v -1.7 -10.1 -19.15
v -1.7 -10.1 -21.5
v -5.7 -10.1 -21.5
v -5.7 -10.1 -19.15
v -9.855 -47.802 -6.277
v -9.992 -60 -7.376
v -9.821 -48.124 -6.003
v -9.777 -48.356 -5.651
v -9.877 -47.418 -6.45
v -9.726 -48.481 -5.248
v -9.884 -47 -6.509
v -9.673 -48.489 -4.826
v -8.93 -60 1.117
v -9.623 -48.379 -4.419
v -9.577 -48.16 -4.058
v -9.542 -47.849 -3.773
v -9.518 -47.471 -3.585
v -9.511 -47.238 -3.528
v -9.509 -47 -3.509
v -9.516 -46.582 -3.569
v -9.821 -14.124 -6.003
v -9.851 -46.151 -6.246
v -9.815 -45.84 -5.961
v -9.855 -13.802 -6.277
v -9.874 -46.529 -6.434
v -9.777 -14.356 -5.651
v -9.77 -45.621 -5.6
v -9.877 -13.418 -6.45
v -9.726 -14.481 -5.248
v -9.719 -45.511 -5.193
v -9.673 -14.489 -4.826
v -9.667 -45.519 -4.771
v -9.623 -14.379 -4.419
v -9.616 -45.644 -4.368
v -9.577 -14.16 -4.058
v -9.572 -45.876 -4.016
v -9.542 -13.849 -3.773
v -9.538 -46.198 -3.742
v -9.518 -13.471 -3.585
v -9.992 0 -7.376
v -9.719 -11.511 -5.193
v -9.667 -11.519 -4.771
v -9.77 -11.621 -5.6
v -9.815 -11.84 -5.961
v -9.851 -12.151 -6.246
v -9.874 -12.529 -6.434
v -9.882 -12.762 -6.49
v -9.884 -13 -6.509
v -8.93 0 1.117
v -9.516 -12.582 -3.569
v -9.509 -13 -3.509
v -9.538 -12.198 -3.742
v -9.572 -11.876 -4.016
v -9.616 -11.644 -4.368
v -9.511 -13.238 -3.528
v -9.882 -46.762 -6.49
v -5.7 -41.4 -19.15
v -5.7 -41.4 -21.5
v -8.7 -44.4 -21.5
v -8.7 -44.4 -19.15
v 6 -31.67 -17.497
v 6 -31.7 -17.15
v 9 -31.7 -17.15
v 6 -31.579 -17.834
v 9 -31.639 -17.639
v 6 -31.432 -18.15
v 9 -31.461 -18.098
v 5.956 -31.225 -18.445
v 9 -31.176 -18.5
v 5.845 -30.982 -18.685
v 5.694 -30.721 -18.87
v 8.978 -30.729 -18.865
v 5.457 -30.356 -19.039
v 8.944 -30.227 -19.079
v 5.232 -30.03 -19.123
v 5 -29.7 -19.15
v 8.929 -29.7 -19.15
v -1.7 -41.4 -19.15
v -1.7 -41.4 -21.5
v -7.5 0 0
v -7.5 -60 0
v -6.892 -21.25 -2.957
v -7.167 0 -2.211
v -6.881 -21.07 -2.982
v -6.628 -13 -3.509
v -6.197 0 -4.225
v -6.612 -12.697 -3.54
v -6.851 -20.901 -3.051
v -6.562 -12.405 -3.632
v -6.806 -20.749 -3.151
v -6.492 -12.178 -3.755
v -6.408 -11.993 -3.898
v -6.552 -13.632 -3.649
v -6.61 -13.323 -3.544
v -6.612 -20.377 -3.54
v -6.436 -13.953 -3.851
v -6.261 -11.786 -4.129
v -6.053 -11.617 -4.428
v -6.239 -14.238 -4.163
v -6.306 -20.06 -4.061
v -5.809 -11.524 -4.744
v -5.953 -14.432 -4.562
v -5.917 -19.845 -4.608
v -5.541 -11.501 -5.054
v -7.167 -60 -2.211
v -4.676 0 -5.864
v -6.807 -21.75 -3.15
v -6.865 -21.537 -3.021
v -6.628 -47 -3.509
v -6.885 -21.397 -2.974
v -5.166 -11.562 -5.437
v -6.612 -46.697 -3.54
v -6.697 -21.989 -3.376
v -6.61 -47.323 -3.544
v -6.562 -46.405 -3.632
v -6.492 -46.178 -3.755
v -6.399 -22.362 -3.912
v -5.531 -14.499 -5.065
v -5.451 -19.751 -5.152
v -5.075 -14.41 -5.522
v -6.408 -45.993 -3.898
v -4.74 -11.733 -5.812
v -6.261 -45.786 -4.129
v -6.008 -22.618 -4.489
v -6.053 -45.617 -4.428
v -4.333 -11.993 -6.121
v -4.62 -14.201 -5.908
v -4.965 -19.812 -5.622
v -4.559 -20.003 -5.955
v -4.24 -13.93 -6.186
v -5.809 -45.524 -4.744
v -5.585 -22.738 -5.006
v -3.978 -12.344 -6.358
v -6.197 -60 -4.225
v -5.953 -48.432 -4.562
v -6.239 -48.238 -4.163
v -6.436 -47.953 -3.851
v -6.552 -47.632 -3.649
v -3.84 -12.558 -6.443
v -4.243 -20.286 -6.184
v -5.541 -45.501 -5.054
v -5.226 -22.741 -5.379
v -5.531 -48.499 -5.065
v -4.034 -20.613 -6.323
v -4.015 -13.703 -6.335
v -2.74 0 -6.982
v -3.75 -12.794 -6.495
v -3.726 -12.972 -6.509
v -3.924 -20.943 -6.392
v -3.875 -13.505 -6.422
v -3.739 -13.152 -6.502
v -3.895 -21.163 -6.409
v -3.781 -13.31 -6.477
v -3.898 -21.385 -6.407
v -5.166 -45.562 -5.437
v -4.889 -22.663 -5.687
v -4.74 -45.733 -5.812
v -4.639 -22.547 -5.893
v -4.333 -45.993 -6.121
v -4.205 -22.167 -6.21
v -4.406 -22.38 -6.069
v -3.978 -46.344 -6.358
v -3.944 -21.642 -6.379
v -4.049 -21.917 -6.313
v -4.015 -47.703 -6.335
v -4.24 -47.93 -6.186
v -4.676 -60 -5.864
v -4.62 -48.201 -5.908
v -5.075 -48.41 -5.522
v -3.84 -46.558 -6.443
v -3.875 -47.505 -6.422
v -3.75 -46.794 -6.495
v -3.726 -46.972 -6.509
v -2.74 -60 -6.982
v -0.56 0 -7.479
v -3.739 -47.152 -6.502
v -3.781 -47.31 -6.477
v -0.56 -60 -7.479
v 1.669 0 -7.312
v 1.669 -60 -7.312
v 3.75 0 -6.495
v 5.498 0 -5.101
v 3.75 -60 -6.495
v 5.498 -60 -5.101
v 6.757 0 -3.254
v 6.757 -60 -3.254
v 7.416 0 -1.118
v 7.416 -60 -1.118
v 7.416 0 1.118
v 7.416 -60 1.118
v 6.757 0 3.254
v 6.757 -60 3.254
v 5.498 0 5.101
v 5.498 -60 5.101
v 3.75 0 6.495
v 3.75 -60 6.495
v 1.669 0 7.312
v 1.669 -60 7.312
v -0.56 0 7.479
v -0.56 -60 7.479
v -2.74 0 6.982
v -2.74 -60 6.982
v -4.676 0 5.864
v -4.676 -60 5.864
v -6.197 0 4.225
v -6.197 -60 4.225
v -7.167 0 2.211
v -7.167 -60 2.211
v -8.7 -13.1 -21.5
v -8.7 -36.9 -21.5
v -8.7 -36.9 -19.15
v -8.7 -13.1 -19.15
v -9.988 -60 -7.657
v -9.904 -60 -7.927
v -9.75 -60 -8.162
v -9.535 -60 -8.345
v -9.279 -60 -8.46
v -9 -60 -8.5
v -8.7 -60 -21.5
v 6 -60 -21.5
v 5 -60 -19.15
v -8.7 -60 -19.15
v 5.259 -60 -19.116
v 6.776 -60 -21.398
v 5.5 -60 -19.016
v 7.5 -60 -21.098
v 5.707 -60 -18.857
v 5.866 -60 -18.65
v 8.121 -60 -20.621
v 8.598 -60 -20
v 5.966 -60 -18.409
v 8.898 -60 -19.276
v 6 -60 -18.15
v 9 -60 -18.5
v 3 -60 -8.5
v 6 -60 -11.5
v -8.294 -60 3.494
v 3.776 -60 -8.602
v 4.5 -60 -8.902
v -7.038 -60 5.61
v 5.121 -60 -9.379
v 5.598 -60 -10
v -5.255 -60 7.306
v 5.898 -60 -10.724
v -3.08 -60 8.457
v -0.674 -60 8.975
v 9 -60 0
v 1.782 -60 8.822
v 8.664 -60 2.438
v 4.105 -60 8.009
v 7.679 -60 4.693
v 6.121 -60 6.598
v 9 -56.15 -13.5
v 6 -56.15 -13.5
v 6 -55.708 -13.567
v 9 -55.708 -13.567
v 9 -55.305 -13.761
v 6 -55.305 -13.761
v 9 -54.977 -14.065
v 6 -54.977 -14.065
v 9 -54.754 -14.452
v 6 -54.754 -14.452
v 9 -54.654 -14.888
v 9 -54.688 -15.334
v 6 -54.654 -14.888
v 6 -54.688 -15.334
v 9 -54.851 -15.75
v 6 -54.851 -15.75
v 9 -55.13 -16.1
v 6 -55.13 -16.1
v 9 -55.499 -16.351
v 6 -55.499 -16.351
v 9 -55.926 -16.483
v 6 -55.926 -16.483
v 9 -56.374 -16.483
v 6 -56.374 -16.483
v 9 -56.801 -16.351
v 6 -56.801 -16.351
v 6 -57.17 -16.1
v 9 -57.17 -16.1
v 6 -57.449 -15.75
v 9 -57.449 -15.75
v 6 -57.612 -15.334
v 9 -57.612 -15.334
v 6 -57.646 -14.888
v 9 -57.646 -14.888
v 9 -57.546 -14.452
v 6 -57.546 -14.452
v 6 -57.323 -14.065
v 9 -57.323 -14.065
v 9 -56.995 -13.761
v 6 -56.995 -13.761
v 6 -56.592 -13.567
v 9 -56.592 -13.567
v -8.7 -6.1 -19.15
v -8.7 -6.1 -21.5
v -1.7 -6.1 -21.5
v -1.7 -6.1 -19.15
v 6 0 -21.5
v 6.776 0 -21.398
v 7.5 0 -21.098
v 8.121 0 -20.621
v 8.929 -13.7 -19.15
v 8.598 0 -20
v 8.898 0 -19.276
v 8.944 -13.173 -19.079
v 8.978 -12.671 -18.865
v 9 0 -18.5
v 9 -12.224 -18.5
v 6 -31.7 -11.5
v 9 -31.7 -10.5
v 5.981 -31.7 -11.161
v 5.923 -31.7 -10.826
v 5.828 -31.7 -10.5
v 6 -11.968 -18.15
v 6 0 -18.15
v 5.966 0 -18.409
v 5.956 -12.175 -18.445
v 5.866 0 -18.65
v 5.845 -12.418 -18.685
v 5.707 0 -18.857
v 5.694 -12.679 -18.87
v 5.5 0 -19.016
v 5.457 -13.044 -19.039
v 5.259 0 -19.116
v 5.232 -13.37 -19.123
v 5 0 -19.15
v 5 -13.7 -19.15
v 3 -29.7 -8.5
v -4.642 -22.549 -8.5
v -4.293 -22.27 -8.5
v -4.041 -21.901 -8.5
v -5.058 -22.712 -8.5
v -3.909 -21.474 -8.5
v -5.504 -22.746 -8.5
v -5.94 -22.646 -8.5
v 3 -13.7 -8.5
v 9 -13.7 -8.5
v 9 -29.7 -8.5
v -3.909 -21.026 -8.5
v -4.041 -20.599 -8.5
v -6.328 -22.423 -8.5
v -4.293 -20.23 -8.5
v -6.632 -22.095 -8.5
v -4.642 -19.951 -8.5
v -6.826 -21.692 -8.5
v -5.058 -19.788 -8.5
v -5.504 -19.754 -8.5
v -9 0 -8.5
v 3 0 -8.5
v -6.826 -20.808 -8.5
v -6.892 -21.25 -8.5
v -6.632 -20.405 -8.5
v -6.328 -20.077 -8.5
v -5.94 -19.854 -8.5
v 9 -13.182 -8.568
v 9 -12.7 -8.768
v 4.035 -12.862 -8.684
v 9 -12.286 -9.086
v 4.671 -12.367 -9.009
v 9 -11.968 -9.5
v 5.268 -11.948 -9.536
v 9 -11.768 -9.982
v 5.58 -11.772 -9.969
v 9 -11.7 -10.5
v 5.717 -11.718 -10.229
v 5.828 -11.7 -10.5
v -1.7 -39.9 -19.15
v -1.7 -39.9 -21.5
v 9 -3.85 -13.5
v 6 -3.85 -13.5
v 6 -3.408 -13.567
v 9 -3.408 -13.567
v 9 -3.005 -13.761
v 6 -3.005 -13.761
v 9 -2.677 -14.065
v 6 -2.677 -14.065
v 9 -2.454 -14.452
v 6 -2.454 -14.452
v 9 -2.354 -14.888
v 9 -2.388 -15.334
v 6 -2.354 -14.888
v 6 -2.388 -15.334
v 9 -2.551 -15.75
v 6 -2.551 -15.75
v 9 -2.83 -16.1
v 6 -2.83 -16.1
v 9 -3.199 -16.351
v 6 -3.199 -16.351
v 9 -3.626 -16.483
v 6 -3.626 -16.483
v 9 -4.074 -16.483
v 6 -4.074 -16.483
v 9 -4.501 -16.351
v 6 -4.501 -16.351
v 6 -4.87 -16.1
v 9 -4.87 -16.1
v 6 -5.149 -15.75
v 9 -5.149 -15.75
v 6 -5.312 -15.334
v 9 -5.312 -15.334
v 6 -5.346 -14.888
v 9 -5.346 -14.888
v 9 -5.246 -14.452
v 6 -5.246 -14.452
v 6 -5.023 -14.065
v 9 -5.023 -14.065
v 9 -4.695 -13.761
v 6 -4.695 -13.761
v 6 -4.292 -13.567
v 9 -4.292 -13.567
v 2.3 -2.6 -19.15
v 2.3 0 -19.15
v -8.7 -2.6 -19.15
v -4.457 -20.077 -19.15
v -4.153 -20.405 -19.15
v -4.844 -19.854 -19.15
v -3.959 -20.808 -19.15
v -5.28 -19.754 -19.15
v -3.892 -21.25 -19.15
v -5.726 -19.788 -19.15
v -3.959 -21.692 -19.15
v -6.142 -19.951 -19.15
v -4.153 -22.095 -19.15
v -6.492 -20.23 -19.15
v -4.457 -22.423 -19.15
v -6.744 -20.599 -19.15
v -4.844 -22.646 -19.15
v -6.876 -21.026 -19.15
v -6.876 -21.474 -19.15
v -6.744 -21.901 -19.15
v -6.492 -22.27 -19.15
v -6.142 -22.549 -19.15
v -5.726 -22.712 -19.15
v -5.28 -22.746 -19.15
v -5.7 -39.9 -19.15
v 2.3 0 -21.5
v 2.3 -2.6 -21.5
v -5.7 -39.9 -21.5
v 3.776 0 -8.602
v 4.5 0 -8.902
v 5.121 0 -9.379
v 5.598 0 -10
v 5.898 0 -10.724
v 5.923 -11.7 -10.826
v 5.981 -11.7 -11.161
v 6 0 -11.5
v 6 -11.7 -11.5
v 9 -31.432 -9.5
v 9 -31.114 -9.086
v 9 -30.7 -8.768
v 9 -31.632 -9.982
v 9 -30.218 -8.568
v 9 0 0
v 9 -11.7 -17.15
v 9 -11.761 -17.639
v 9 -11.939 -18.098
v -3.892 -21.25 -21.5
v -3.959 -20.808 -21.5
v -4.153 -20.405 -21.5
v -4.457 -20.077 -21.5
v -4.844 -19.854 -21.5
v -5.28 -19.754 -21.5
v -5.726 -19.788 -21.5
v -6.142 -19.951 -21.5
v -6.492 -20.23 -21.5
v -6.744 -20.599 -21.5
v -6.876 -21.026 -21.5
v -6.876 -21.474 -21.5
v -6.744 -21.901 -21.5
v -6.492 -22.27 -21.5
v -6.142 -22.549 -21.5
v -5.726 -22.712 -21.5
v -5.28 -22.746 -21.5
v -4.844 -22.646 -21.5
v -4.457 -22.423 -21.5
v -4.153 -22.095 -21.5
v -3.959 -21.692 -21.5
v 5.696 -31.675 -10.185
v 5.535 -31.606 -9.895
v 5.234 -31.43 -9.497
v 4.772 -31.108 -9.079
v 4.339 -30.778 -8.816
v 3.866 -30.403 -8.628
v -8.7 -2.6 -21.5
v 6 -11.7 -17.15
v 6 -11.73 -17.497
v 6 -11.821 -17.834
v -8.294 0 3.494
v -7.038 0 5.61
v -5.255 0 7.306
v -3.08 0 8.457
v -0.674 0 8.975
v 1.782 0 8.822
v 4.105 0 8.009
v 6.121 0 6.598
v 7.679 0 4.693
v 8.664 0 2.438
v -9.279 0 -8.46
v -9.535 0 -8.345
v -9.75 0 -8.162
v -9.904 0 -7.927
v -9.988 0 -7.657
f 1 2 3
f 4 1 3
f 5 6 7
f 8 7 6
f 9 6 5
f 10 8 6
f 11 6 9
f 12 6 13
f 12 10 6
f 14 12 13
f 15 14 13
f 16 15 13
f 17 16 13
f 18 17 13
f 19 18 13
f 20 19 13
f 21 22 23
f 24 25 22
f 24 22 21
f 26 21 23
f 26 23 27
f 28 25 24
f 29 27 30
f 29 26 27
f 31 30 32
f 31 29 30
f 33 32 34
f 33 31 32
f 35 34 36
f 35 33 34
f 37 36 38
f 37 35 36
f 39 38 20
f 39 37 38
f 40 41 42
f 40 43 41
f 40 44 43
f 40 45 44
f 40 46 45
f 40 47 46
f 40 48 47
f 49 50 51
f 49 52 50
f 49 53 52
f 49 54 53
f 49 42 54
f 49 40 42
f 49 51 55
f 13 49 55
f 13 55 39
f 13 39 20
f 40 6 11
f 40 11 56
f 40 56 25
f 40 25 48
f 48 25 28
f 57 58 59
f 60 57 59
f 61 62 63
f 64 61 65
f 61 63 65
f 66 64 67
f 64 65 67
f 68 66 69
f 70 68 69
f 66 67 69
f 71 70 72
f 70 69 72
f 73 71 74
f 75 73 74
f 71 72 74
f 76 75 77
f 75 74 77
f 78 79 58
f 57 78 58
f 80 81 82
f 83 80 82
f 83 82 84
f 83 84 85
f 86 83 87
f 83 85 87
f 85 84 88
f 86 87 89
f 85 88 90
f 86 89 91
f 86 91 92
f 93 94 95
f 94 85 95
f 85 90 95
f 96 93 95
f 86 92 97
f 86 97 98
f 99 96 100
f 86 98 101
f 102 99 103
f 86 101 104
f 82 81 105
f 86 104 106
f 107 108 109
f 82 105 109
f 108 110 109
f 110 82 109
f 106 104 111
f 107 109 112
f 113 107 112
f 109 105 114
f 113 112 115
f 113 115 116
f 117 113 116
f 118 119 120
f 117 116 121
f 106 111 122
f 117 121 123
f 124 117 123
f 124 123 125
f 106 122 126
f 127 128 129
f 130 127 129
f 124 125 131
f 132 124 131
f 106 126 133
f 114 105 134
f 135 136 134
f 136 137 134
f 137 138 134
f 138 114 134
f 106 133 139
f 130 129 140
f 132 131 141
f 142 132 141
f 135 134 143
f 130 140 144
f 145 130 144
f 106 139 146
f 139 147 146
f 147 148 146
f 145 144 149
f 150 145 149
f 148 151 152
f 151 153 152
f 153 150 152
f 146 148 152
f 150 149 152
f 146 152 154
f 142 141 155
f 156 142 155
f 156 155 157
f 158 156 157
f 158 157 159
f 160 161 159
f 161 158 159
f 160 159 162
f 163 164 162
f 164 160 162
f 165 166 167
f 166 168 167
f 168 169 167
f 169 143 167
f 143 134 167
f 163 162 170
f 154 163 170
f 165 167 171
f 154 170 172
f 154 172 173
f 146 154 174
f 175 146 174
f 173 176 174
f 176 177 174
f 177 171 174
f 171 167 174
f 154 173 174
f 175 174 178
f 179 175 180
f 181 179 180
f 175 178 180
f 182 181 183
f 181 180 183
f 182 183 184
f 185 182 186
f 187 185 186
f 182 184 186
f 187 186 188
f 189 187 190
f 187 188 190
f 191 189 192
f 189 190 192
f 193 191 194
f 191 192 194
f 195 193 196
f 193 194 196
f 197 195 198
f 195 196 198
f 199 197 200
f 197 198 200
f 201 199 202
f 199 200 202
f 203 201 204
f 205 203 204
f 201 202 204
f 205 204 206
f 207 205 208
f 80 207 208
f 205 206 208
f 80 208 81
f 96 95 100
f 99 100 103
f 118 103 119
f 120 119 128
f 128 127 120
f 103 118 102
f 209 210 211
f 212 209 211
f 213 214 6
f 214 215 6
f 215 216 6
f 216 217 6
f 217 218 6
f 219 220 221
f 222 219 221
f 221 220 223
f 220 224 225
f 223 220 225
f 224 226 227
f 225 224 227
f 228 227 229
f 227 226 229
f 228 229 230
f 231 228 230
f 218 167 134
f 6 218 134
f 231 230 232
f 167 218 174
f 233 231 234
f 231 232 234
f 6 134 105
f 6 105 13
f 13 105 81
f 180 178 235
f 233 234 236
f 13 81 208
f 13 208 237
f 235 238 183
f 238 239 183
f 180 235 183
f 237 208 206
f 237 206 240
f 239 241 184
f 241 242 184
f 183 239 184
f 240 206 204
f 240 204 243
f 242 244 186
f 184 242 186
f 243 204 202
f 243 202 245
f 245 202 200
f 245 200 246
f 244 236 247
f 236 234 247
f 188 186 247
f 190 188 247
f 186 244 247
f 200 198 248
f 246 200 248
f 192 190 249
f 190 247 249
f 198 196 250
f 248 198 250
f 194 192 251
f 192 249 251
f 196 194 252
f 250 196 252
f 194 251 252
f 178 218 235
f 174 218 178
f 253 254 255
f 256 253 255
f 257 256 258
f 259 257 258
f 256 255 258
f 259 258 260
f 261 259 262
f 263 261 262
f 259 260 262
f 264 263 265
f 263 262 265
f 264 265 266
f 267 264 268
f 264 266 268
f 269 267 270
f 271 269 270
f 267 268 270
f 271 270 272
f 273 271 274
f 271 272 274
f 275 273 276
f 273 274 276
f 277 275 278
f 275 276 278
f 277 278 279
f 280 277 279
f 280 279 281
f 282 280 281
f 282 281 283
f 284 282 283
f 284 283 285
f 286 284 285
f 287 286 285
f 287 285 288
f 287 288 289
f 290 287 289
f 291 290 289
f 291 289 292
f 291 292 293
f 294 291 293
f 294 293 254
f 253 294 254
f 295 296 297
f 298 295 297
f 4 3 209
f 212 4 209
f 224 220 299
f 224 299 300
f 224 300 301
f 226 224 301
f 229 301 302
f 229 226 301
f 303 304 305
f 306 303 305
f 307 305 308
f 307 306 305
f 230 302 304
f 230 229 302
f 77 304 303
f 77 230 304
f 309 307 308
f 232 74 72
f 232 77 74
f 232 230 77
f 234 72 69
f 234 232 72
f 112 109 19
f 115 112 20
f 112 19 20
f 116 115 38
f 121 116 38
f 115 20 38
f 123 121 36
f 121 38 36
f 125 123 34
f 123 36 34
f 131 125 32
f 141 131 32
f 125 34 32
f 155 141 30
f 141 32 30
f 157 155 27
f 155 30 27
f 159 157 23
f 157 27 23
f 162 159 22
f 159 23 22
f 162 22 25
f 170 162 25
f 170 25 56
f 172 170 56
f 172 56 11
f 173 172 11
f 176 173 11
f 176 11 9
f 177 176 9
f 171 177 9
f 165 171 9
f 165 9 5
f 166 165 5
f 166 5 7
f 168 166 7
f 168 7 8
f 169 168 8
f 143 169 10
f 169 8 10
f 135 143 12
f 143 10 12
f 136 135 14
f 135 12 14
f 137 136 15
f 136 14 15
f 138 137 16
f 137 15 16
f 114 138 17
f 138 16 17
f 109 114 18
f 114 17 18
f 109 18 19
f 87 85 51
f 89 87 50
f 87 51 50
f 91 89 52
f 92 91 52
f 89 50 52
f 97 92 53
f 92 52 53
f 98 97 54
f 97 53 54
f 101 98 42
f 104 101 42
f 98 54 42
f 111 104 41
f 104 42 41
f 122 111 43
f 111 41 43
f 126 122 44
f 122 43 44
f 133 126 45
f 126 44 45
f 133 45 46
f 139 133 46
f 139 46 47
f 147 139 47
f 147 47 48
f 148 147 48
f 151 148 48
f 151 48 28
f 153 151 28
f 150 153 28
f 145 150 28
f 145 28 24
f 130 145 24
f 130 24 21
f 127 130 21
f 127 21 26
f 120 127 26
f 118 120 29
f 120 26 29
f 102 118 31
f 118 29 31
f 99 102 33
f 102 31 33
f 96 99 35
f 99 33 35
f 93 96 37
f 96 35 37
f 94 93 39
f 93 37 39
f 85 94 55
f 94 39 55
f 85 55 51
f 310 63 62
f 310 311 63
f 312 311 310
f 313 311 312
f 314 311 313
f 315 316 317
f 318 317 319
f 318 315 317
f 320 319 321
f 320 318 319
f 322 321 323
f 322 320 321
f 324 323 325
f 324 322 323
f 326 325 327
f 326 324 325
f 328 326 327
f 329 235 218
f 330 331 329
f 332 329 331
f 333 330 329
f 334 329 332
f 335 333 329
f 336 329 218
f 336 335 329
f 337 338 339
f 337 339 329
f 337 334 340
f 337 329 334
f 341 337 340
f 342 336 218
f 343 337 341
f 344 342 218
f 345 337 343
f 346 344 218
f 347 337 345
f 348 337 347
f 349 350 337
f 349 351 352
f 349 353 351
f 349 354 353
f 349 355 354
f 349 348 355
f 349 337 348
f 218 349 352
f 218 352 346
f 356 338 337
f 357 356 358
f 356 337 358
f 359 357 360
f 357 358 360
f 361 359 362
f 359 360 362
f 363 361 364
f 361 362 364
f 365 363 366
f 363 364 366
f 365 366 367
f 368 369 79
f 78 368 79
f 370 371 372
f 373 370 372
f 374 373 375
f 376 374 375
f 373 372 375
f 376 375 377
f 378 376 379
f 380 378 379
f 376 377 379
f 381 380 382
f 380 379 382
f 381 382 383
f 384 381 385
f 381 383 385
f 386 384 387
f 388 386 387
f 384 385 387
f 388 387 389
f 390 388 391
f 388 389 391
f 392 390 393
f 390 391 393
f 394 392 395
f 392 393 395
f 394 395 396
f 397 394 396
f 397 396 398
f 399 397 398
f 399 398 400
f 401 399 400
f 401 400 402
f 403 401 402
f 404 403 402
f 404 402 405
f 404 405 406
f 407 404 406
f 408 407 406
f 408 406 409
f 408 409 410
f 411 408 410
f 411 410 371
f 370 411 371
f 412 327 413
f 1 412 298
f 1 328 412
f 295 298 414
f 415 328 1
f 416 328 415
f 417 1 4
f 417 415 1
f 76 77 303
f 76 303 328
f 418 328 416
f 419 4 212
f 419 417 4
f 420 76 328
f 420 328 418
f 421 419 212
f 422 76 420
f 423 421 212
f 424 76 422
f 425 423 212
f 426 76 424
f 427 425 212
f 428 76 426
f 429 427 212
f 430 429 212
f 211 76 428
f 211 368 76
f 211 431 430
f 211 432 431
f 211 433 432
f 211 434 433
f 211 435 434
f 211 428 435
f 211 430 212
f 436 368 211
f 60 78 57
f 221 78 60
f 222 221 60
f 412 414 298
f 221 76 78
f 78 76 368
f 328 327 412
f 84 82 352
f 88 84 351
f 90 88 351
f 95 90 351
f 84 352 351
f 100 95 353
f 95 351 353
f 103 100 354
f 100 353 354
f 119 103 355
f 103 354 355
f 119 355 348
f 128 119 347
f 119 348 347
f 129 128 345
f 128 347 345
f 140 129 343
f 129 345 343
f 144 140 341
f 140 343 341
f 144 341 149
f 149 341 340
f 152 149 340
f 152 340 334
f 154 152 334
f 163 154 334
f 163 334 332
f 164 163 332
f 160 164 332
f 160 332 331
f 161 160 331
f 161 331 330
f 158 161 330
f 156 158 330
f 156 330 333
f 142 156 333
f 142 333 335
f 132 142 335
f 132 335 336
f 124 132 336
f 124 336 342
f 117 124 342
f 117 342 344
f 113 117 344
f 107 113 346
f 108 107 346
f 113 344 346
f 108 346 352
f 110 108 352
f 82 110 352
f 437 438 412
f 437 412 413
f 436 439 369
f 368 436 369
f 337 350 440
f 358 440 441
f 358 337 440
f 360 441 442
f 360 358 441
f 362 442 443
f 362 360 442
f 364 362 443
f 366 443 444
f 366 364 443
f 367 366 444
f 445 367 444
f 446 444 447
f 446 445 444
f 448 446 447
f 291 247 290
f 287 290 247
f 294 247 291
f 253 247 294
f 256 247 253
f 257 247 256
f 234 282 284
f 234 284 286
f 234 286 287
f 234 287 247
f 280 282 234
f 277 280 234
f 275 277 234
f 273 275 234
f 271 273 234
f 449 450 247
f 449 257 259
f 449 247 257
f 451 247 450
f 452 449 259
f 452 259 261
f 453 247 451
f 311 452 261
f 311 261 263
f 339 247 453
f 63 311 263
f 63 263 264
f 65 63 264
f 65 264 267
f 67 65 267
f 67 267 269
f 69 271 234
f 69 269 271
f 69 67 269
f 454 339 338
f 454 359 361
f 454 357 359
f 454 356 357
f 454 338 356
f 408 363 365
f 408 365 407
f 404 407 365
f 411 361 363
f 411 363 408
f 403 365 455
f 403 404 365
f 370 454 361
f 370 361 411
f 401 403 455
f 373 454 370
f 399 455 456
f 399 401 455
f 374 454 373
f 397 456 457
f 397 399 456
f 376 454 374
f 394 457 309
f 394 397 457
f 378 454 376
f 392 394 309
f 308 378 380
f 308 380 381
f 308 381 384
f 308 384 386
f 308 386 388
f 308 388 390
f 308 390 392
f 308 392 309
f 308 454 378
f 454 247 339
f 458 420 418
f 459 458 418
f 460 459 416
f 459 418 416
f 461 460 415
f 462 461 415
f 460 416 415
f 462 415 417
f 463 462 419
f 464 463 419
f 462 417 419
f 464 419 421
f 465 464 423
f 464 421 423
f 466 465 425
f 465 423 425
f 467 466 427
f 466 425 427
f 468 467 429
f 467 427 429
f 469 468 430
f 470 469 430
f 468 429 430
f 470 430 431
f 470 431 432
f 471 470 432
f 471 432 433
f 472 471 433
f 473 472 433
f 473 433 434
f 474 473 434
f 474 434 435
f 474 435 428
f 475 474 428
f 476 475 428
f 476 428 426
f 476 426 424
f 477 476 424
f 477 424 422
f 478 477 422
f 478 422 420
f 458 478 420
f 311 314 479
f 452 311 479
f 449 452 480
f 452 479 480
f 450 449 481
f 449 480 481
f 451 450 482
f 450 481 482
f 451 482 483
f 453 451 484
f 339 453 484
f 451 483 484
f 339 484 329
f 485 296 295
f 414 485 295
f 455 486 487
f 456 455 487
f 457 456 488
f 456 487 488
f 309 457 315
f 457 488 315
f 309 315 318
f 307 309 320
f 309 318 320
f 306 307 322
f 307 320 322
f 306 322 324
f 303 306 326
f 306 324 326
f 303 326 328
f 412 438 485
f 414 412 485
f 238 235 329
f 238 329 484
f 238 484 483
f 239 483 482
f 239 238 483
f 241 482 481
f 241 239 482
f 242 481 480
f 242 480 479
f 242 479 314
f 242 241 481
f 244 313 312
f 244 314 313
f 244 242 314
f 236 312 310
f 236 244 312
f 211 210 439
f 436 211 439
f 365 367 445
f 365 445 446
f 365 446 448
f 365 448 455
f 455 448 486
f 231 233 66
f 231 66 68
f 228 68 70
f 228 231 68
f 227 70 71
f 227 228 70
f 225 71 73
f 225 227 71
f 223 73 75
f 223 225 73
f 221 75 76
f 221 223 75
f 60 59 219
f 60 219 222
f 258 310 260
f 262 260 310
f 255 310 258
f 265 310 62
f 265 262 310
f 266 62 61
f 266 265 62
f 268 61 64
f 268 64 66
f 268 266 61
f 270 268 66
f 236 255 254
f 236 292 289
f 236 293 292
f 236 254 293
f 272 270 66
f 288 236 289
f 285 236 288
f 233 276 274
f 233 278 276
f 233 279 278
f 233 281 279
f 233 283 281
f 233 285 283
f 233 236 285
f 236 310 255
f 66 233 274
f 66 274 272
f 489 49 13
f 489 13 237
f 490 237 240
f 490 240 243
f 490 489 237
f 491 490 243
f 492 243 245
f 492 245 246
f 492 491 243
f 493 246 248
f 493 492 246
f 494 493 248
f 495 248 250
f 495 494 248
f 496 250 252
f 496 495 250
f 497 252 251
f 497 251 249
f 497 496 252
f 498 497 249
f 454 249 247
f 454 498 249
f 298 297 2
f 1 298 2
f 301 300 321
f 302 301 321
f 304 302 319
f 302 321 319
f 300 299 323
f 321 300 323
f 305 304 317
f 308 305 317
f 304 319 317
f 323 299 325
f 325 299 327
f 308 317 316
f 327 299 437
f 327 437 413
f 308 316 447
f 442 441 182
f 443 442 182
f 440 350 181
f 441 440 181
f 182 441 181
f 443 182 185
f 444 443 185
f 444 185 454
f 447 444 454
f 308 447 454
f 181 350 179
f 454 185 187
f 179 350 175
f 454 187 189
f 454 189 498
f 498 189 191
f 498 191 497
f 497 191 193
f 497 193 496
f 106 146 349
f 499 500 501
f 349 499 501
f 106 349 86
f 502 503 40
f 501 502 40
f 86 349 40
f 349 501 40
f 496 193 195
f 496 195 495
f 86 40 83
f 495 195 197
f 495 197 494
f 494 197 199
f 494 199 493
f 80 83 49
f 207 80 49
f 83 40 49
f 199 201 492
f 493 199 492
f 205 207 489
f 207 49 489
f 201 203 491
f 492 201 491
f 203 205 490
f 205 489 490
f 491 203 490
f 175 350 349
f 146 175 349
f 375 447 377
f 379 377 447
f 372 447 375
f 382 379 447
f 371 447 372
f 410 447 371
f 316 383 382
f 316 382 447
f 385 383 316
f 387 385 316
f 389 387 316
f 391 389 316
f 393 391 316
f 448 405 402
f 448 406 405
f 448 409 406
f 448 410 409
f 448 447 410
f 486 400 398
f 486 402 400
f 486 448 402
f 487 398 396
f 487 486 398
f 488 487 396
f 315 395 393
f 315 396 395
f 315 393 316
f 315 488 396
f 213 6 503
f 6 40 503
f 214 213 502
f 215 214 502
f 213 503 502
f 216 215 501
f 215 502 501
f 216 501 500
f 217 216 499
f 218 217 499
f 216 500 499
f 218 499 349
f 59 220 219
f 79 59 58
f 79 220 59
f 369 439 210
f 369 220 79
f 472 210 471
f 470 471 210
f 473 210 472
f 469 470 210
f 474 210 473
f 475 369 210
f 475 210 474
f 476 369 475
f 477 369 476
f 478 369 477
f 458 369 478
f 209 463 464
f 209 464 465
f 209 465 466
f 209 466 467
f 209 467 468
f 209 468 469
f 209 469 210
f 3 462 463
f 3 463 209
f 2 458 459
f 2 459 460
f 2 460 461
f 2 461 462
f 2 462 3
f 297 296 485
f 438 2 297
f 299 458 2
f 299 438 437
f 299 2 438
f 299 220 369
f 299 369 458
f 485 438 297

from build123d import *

# Parameters (mm, degrees)
EXTRUDE_1_DEPTH            = 11.7
EXTRUDE_2_DEPTH            = 20
SKETCH_3_W                 = 3
SKETCH_3_H                 = 2.35
EXTRUDE_3_DEPTH            = 20
EXTRUDE_4_DEPTH            = 28.3
SKETCH_5_W                 = 2.35
SKETCH_5_H                 = 60
EXTRUDE_5_DEPTH            = 14.7
CUT_EXTRUDE_1_REACH        = 70.066
SKETCH_6_W                 = 11
SKETCH_6_H                 = 2.6
CUT_EXTRUDE_2_REACH        = 70.066
CUT_EXTRUDE_3_REACH        = 70.066
HOLE_WIZARD_3_0_3_1_D      = 3
HOLE_WIZARD_3_0_3_1_DEPTH  = 19.132814283
HOLE_WIZARD_3_0_3_2_D      = 3
HOLE_WIZARD_3_0_3_2_DEPTH  = 2.35
HOLE_WIZARD_15_0_15_1_D    = 15
HOLE_WIZARD_3_0_3_3_REACH  = 65.316
HOLE_WIZARD_3_0_3_3_BORE_R = 1.5
HOLE_WIZARD_3_0_3_4_REACH  = 68.474
HOLE_WIZARD_3_0_3_4_BORE_R = 1.5
FILLET_1_R                 = 1
FILLET_2_R                 = 2
FILLET_START               = 2.9999999
FILLET_3_DEPTH             = 3.0000001
FILLET_START_2             = -60
FILLET_3_2_DEPTH           = 60


with BuildPart() as part:
    # Эскиз1 → Бобышка-Вытянуть1 (new body)
    with BuildSketch(Plane(origin=(0, 0, 0), x_dir=(1, 0, 0), z_dir=(0, 1, 0))):
        with BuildLine():
            Line((9, 21.5), (6, 21.5))
            Line((6, 21.5), (6, 8.5))
            Line((6, 8.5), (-10.132814283, 8.5))
            Line((-10.132814283, 8.5), (-8.930469533, -1.11656344))
            ThreePointArc((-8.930469533, -1.11656344), (0.55936312, -8.982600564), (9, 0))
            Line((9, 0), (9, 21.5))
        make_face()
    extrude(amount=-EXTRUDE_1_DEPTH)

    # Эскиз2 → Бобышка-Вытянуть2 (add)
    with BuildSketch(Plane.XZ.offset(11.7)):
        with BuildLine():
            Line((9, -8.5), (-10.132814283, -8.5))
            Line((-10.132814283, -8.5), (-8.930469533, 1.11656344))
            ThreePointArc((-8.930469533, 1.11656344), (0.55936312, 8.982600564), (9, 0))
            Line((9, 0), (9, -8.5))
        make_face()
    extrude(amount=EXTRUDE_2_DEPTH)

    # Эскиз3 → Бобышка-Вытянуть3 (add)
    with BuildSketch(Plane.XZ.offset(11.7)):
        with Locations((7.5, -20.325)):
            Rectangle(SKETCH_3_W, SKETCH_3_H)
    extrude(amount=EXTRUDE_3_DEPTH)

    # Эскиз4 → Бобышка-Вытянуть4 (add)
    with BuildSketch(Plane.XZ.offset(31.7)):
        with BuildLine():
            Line((6, -21.5), (6, -8.5))
            Line((6, -8.5), (-10.132814283, -8.5))
            Line((-10.132814283, -8.5), (-8.930469533, 1.11656344))
            ThreePointArc((-8.930469533, 1.11656344), (0.55936312, 8.982600564), (9, 0))
            Line((9, 0), (9, -21.5))
            Line((9, -21.5), (6, -21.5))
        make_face()
    extrude(amount=EXTRUDE_4_DEPTH)

    # Эскиз5 → Бобышка-Вытянуть5 (add)
    with BuildSketch(Plane.ZY.offset(-6)):
        with Locations((-20.325, -30)):
            Rectangle(SKETCH_5_W, SKETCH_5_H)
    extrude(amount=EXTRUDE_5_DEPTH)

    # Эскиз6 → Вырез-Вытянуть1 (cut, up to next)
    with BuildSketch(Plane(origin=(0, 0, -21.5), x_dir=(-1, 0, 0), z_dir=(0, 0, -1)), mode=Mode.PRIVATE) as cut_extrude_1_sk1:
        with Locations((3.2, -1.3)):
            Rectangle(SKETCH_6_W, SKETCH_6_H)
    cut_extrude_1_tool1 = extrude(cut_extrude_1_sk1.sketch, amount=-CUT_EXTRUDE_1_REACH, mode=Mode.PRIVATE) & part.part
    add(cut_extrude_1_tool1.solids().sort_by_distance((-3.2, -1.3, -21.5))[0], mode=Mode.SUBTRACT)

    # Эскиз7 → Вырез-Вытянуть2 (cut, up to next)
    with BuildSketch(Plane(origin=(0, 0, -21.5), x_dir=(-1, 0, 0), z_dir=(0, 0, -1)), mode=Mode.PRIVATE) as cut_extrude_2_sk1:
        Polygon((8.7, -13.1), (8.7, -6.1), (1.7, -6.1), (1.7, -10.1), (5.7, -10.1), align=None)
    cut_extrude_2_tool1 = extrude(cut_extrude_2_sk1.sketch, amount=-CUT_EXTRUDE_2_REACH, mode=Mode.PRIVATE) & part.part
    add(cut_extrude_2_tool1.solids().sort_by_distance((-5.546154, -8.515385, -21.5))[0], mode=Mode.SUBTRACT)

    # Эскиз8 → Вырез-Вытянуть3 (cut, up to next)
    with BuildSketch(Plane(origin=(0, 0, -21.5), x_dir=(-1, 0, 0), z_dir=(0, 0, -1)), mode=Mode.PRIVATE) as cut_extrude_3_sk1:
        Polygon((8.7, -44.4), (8.7, -36.9), (5.7, -39.9), (1.7, -39.9), (1.7, -41.4), (5.7, -41.4), align=None)
    cut_extrude_3_tool1 = extrude(cut_extrude_3_sk1.sketch, amount=-CUT_EXTRUDE_3_REACH, mode=Mode.PRIVATE) & part.part
    add(cut_extrude_3_tool1.solids().sort_by_distance((-6.353846, -40.65, -21.5))[0], mode=Mode.SUBTRACT)

    # Диаметр отверстия Ø3.0 (3)1
    with Locations(Plane(origin=(9, 0, 0), x_dir=(0, 0, -1), z_dir=(1, 0, 0))):
        with Locations((15, -3.85), (15, -56.15)):
            Hole(HOLE_WIZARD_3_0_3_1_D / 2, depth=HOLE_WIZARD_3_0_3_1_DEPTH)

    # Диаметр отверстия Ø3.0 (3)2
    with Locations(Plane(origin=(0, 0, -21.5), x_dir=(-1, 0, 0), z_dir=(0, 0, -1))):
        with Locations((5.392274393, -21.25)):
            Hole(HOLE_WIZARD_3_0_3_2_D / 2, depth=HOLE_WIZARD_3_0_3_2_DEPTH)

    # Диаметр отверстия Ø15.0 (15)1 (through all)
    with Locations(Plane(origin=(0, 0, 0), x_dir=(1, 0, 0), z_dir=(0, 1, 0))):
        with Locations((0, 0)):
            Hole(HOLE_WIZARD_15_0_15_1_D / 2)

    # Диаметр отверстия Ø3.0 (3)3 bore → Диаметр отверстия Ø3.0 (3)3 (cut, up to next)
    with BuildSketch(Plane(origin=(0, 0, -8.5), x_dir=(-1, 0, 0), z_dir=(0, 0, -1)), mode=Mode.PRIVATE) as hole_wizard_3_0_3_3_sk1:
        with Locations((5.392274393, -21.25)):
            Circle(HOLE_WIZARD_3_0_3_3_BORE_R)
    hole_wizard_3_0_3_3_tool1 = extrude(hole_wizard_3_0_3_3_sk1.sketch, amount=-HOLE_WIZARD_3_0_3_3_REACH, mode=Mode.PRIVATE) & part.part
    add(hole_wizard_3_0_3_3_tool1.solids().sort_by_distance((-5.392274, -21.25, -8.5))[0], mode=Mode.SUBTRACT)

    # Диаметр отверстия Ø3.0 (3)4 bore → Диаметр отверстия Ø3.0 (3)4 (cut, up to next)
    with BuildSketch(Plane.ZY.offset(9.883926163), mode=Mode.PRIVATE) as hole_wizard_3_0_3_4_sk1:
        with Locations((-5.009349323, -13)):
            Circle(HOLE_WIZARD_3_0_3_4_BORE_R)
    hole_wizard_3_0_3_4_tool1 = extrude(hole_wizard_3_0_3_4_sk1.sketch, amount=-HOLE_WIZARD_3_0_3_4_REACH, mode=Mode.PRIVATE) & part.part
    # Диаметр отверстия Ø3.0 (3)4 bore → Диаметр отверстия Ø3.0 (3)4 (cut, up to next)
    with BuildSketch(Plane.ZY.offset(9.883926163), mode=Mode.PRIVATE) as hole_wizard_3_0_3_4_sk2:
        with Locations((-5.009349323, -47)):
            Circle(HOLE_WIZARD_3_0_3_4_BORE_R)
    hole_wizard_3_0_3_4_tool2 = extrude(hole_wizard_3_0_3_4_sk2.sketch, amount=-HOLE_WIZARD_3_0_3_4_REACH, mode=Mode.PRIVATE) & part.part
    add(hole_wizard_3_0_3_4_tool1.solids().sort_by_distance((-9.883926, -13, -5.009349))[0], mode=Mode.SUBTRACT)
    add(hole_wizard_3_0_3_4_tool2.solids().sort_by_distance((-9.883926, -47, -5.009349))[0], mode=Mode.SUBTRACT)

    # Скругление1
    fillet_1_edges = [part.edges().sort_by_distance(p)[0] for p in [
        (-10.132814283, -30, -8.5),
        (6, -45.85, -19.15),
        (6, -5.85, -19.15),
    ]]
    fillet(fillet_1_edges, radius=FILLET_1_R)

    # Скругление2
    fillet_2_edges = [part.edges().sort_by_distance(p)[0] for p in [
        (7, -11.7, -19.15),
        (7.5, -31.7, -8.5),
        (7.5, -11.7, -8.5),
        (7, -31.7, -19.15),
    ]]
    fillet(fillet_2_edges, radius=FILLET_2_R)

    # Скругление3: read off the stored shape, not the designer's step
    # Скругление3 outline → Скругление3 (add)
    with BuildSketch(Plane.YZ.offset(FILLET_START)):
        with BuildLine():
            Line((-13.7, -19.15), (0, -19.15))
            Line((0, -19.15), (0, -8.5))
            Line((0, -8.5), (-13.7, -8.5))
            ThreePointArc((-13.7, -8.5), (-12.285786438, -9.085786438), (-11.7, -10.5))
            Line((-11.7, -10.5), (-11.7, -17.15))
            ThreePointArc((-11.7, -17.15), (-12.285786438, -18.564213562), (-13.7, -19.15))
        make_face()
        with BuildLine():
            Line((-60, -8.5), (-60, -19.15))
            Line((-60, -19.15), (-29.7, -19.15))
            ThreePointArc((-29.7, -19.15), (-31.114213562, -18.564213562), (-31.7, -17.15))
            Line((-31.7, -17.15), (-31.7, -10.5))
            ThreePointArc((-31.7, -10.5), (-31.114213562, -9.085786438), (-29.7, -8.5))
            Line((-29.7, -8.5), (-60, -8.5))
        make_face()
    extrude(amount=FILLET_3_DEPTH)

    # Fillet 3 2 outline → Fillet 3 2 (cut)
    with BuildSketch(Plane(origin=(0, 0, 0), x_dir=(1, 0, 0), z_dir=(0, 1, 0)).offset(FILLET_START_2)):
        with BuildLine():
            ThreePointArc((6, 21.5), (8.121320344, 20.621320344), (9, 18.5))
            Line((9, 18.5), (9, 21.5))
            Line((9, 21.5), (6, 21.5))
        make_face()
        with BuildLine():
            Line((6, 11.5), (6, 18.15))
            ThreePointArc((6, 18.15), (5.707106781, 18.857106781), (5, 19.15))
            Line((5, 19.15), (2.9999999, 19.15))
            Line((2.9999999, 19.15), (3, 8.5))
            ThreePointArc((3, 8.5), (5.121320344, 9.378679656), (6, 11.5))
        make_face()
    extrude(amount=FILLET_3_2_DEPTH, mode=Mode.SUBTRACT)


solid = part.part
